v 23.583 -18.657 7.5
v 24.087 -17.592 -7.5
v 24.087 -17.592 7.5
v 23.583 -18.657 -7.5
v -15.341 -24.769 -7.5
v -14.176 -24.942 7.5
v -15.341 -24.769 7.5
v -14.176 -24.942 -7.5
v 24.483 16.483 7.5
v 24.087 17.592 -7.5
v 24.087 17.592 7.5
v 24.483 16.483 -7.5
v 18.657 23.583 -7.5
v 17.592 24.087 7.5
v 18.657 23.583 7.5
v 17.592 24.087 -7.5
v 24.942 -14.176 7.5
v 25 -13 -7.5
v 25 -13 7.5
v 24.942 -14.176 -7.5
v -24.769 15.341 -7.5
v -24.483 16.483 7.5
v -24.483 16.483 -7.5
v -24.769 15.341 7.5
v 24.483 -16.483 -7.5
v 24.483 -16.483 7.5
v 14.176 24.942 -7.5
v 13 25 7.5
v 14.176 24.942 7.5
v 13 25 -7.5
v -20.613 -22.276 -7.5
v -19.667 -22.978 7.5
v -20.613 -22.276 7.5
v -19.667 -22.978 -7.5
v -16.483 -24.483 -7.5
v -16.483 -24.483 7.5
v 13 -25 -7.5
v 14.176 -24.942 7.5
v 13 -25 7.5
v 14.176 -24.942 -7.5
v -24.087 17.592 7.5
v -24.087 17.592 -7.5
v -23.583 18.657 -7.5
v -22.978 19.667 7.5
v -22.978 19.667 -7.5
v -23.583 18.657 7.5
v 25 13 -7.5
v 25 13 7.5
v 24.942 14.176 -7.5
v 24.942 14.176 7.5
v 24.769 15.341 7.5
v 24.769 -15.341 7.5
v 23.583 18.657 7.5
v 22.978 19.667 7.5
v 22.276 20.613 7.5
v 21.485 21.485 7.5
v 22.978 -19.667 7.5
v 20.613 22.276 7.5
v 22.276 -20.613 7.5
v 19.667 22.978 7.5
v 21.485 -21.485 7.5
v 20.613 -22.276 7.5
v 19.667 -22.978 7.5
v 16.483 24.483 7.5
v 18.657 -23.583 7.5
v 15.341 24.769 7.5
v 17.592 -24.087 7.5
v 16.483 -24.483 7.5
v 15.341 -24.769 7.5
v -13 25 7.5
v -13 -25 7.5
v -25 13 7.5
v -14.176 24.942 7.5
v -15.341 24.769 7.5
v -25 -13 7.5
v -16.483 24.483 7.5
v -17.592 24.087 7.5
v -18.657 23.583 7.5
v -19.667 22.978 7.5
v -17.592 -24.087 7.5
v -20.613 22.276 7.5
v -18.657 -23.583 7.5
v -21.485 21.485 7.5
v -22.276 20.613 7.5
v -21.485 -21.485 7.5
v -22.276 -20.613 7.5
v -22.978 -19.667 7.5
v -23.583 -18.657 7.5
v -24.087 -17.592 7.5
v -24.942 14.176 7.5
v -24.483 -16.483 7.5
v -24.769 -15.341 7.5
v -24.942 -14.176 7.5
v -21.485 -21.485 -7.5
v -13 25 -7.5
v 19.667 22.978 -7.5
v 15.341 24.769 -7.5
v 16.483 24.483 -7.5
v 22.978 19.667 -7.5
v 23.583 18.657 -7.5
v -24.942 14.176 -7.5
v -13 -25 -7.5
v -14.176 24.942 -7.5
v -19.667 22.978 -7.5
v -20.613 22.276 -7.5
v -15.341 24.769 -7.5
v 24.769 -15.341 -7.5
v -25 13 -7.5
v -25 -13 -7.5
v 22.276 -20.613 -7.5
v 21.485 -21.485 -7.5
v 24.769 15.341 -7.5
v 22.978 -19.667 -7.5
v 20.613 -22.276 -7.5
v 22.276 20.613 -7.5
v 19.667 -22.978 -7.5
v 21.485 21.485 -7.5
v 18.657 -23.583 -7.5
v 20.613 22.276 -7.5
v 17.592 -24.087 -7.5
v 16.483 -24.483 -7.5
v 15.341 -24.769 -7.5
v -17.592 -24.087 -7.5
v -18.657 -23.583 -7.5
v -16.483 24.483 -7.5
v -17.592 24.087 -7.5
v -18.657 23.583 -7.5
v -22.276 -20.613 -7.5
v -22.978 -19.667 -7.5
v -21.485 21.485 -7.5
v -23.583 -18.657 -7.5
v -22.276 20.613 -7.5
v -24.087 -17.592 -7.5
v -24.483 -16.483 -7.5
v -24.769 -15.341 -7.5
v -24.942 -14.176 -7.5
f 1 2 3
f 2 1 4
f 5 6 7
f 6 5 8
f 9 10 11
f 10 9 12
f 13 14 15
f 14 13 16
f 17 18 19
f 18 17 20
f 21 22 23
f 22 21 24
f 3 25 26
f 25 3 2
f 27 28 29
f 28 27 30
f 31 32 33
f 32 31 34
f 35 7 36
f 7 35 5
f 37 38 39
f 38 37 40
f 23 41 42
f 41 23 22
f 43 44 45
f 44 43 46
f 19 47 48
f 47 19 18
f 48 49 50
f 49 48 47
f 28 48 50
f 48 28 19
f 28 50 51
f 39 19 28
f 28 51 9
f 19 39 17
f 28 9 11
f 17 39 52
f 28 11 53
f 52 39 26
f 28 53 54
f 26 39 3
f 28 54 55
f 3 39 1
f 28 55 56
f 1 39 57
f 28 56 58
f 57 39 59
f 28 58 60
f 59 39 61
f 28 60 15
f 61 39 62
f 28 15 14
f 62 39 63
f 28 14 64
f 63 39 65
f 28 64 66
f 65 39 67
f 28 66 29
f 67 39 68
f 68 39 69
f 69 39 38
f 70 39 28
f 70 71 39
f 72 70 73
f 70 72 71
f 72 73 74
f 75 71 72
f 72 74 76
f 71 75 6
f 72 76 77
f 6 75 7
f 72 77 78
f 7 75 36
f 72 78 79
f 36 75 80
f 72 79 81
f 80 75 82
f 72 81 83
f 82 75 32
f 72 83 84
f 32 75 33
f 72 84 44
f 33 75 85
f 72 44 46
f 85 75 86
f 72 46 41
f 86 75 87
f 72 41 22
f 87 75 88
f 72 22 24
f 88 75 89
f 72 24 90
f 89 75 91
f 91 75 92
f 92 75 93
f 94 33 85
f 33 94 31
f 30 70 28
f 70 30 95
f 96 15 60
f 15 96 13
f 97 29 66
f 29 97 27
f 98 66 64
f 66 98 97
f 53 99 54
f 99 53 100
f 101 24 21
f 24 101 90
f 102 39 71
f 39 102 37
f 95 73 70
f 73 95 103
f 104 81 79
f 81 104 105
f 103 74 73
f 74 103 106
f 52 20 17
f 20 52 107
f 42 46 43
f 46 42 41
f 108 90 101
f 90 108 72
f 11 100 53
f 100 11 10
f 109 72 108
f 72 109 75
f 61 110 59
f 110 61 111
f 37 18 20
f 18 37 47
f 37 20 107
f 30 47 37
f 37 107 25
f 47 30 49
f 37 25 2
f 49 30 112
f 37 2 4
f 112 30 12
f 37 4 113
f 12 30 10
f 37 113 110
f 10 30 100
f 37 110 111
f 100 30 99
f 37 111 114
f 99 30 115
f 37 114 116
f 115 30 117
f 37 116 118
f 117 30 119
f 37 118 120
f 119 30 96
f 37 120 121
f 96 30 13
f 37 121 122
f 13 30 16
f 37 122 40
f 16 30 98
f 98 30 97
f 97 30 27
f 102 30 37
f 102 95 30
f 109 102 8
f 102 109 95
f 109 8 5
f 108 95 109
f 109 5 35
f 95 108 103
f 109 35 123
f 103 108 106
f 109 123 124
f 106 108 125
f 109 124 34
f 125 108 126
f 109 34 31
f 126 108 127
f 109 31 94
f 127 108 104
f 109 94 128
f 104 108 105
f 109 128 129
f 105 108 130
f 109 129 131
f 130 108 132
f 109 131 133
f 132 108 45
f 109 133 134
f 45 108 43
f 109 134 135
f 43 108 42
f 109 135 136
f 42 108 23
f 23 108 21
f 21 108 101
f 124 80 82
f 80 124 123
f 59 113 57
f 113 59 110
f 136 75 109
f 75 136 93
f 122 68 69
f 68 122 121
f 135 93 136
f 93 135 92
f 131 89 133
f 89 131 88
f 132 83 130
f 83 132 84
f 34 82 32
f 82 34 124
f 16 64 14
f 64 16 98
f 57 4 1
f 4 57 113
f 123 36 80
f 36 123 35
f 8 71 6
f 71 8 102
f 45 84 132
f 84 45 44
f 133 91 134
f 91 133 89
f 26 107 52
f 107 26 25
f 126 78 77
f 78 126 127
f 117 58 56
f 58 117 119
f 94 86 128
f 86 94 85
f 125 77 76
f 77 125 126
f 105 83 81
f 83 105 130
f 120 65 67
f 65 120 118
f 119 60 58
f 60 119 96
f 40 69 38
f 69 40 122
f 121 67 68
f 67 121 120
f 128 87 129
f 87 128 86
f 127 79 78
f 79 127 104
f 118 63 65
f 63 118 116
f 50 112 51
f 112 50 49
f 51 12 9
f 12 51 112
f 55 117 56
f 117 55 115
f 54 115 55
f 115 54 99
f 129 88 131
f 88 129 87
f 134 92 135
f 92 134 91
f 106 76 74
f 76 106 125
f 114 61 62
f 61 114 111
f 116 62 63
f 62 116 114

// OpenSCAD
// GenericHolder2.0
// 
// A simple, generic insert for blocky things
// that are to fit inside other blocky things.

description = "";
size = [50, 50, 15]; // 0.1
cavity_size = [0, 0]; // 0.1
bottom_hole_size = [0,0]; // 0.2
floor_thickness = 3.2; // 0.1
front_slot_width = 0; // 0.1
$fn = 64;

use <../lib/TOGridLib3.scad>
use <../lib/TOGMod1.scad>
use <../lib/TOGPath1.scad>
use <../lib/TOGPolyhedronLib1.scad>
use <../lib/TOGArrayLib1.scad>
use <../lib/TOGVecLib0.scad>

function genericinsert2_volume( vec ) = tal1_reduce(1, vec, function(a,b) a*b);

togmod1_domodule(
let(height = size[2])
let(z_mid = 0)
let(crad = min(12, max((size[0]-cavity_size[0])/2, (size[1]-cavity_size[1])/2)))
let(hull = tphl1_make_rounded_cuboid(size, r=[crad,crad,0]))
let(cavity = genericinsert2_volume(cavity_size) == 0 ? ["union"] :
	["translate", [0,0,height/2], tphl1_make_rounded_cuboid([cavity_size[0], cavity_size[1], (height-floor_thickness)*2], r=[1,1,0])])
let(bottom_hole =  genericinsert2_volume(bottom_hole_size) == 0 ? ["union"] :
   tphl1_make_rounded_cuboid([bottom_hole_size[0], bottom_hole_size[1], height*2], r=[1,1,0]))
let(front_slot = front_slot_width == 0 ? ["union"] :
	["translate", [0,-(size[1]+bottom_hole_size[1])/4,0], tphl1_make_rounded_cuboid([front_slot_width, (size[1]-bottom_hole_size[1]), height*2], r=0)])
["difference",
	hull,
	cavity,
	bottom_hole,
	front_slot,
]);
